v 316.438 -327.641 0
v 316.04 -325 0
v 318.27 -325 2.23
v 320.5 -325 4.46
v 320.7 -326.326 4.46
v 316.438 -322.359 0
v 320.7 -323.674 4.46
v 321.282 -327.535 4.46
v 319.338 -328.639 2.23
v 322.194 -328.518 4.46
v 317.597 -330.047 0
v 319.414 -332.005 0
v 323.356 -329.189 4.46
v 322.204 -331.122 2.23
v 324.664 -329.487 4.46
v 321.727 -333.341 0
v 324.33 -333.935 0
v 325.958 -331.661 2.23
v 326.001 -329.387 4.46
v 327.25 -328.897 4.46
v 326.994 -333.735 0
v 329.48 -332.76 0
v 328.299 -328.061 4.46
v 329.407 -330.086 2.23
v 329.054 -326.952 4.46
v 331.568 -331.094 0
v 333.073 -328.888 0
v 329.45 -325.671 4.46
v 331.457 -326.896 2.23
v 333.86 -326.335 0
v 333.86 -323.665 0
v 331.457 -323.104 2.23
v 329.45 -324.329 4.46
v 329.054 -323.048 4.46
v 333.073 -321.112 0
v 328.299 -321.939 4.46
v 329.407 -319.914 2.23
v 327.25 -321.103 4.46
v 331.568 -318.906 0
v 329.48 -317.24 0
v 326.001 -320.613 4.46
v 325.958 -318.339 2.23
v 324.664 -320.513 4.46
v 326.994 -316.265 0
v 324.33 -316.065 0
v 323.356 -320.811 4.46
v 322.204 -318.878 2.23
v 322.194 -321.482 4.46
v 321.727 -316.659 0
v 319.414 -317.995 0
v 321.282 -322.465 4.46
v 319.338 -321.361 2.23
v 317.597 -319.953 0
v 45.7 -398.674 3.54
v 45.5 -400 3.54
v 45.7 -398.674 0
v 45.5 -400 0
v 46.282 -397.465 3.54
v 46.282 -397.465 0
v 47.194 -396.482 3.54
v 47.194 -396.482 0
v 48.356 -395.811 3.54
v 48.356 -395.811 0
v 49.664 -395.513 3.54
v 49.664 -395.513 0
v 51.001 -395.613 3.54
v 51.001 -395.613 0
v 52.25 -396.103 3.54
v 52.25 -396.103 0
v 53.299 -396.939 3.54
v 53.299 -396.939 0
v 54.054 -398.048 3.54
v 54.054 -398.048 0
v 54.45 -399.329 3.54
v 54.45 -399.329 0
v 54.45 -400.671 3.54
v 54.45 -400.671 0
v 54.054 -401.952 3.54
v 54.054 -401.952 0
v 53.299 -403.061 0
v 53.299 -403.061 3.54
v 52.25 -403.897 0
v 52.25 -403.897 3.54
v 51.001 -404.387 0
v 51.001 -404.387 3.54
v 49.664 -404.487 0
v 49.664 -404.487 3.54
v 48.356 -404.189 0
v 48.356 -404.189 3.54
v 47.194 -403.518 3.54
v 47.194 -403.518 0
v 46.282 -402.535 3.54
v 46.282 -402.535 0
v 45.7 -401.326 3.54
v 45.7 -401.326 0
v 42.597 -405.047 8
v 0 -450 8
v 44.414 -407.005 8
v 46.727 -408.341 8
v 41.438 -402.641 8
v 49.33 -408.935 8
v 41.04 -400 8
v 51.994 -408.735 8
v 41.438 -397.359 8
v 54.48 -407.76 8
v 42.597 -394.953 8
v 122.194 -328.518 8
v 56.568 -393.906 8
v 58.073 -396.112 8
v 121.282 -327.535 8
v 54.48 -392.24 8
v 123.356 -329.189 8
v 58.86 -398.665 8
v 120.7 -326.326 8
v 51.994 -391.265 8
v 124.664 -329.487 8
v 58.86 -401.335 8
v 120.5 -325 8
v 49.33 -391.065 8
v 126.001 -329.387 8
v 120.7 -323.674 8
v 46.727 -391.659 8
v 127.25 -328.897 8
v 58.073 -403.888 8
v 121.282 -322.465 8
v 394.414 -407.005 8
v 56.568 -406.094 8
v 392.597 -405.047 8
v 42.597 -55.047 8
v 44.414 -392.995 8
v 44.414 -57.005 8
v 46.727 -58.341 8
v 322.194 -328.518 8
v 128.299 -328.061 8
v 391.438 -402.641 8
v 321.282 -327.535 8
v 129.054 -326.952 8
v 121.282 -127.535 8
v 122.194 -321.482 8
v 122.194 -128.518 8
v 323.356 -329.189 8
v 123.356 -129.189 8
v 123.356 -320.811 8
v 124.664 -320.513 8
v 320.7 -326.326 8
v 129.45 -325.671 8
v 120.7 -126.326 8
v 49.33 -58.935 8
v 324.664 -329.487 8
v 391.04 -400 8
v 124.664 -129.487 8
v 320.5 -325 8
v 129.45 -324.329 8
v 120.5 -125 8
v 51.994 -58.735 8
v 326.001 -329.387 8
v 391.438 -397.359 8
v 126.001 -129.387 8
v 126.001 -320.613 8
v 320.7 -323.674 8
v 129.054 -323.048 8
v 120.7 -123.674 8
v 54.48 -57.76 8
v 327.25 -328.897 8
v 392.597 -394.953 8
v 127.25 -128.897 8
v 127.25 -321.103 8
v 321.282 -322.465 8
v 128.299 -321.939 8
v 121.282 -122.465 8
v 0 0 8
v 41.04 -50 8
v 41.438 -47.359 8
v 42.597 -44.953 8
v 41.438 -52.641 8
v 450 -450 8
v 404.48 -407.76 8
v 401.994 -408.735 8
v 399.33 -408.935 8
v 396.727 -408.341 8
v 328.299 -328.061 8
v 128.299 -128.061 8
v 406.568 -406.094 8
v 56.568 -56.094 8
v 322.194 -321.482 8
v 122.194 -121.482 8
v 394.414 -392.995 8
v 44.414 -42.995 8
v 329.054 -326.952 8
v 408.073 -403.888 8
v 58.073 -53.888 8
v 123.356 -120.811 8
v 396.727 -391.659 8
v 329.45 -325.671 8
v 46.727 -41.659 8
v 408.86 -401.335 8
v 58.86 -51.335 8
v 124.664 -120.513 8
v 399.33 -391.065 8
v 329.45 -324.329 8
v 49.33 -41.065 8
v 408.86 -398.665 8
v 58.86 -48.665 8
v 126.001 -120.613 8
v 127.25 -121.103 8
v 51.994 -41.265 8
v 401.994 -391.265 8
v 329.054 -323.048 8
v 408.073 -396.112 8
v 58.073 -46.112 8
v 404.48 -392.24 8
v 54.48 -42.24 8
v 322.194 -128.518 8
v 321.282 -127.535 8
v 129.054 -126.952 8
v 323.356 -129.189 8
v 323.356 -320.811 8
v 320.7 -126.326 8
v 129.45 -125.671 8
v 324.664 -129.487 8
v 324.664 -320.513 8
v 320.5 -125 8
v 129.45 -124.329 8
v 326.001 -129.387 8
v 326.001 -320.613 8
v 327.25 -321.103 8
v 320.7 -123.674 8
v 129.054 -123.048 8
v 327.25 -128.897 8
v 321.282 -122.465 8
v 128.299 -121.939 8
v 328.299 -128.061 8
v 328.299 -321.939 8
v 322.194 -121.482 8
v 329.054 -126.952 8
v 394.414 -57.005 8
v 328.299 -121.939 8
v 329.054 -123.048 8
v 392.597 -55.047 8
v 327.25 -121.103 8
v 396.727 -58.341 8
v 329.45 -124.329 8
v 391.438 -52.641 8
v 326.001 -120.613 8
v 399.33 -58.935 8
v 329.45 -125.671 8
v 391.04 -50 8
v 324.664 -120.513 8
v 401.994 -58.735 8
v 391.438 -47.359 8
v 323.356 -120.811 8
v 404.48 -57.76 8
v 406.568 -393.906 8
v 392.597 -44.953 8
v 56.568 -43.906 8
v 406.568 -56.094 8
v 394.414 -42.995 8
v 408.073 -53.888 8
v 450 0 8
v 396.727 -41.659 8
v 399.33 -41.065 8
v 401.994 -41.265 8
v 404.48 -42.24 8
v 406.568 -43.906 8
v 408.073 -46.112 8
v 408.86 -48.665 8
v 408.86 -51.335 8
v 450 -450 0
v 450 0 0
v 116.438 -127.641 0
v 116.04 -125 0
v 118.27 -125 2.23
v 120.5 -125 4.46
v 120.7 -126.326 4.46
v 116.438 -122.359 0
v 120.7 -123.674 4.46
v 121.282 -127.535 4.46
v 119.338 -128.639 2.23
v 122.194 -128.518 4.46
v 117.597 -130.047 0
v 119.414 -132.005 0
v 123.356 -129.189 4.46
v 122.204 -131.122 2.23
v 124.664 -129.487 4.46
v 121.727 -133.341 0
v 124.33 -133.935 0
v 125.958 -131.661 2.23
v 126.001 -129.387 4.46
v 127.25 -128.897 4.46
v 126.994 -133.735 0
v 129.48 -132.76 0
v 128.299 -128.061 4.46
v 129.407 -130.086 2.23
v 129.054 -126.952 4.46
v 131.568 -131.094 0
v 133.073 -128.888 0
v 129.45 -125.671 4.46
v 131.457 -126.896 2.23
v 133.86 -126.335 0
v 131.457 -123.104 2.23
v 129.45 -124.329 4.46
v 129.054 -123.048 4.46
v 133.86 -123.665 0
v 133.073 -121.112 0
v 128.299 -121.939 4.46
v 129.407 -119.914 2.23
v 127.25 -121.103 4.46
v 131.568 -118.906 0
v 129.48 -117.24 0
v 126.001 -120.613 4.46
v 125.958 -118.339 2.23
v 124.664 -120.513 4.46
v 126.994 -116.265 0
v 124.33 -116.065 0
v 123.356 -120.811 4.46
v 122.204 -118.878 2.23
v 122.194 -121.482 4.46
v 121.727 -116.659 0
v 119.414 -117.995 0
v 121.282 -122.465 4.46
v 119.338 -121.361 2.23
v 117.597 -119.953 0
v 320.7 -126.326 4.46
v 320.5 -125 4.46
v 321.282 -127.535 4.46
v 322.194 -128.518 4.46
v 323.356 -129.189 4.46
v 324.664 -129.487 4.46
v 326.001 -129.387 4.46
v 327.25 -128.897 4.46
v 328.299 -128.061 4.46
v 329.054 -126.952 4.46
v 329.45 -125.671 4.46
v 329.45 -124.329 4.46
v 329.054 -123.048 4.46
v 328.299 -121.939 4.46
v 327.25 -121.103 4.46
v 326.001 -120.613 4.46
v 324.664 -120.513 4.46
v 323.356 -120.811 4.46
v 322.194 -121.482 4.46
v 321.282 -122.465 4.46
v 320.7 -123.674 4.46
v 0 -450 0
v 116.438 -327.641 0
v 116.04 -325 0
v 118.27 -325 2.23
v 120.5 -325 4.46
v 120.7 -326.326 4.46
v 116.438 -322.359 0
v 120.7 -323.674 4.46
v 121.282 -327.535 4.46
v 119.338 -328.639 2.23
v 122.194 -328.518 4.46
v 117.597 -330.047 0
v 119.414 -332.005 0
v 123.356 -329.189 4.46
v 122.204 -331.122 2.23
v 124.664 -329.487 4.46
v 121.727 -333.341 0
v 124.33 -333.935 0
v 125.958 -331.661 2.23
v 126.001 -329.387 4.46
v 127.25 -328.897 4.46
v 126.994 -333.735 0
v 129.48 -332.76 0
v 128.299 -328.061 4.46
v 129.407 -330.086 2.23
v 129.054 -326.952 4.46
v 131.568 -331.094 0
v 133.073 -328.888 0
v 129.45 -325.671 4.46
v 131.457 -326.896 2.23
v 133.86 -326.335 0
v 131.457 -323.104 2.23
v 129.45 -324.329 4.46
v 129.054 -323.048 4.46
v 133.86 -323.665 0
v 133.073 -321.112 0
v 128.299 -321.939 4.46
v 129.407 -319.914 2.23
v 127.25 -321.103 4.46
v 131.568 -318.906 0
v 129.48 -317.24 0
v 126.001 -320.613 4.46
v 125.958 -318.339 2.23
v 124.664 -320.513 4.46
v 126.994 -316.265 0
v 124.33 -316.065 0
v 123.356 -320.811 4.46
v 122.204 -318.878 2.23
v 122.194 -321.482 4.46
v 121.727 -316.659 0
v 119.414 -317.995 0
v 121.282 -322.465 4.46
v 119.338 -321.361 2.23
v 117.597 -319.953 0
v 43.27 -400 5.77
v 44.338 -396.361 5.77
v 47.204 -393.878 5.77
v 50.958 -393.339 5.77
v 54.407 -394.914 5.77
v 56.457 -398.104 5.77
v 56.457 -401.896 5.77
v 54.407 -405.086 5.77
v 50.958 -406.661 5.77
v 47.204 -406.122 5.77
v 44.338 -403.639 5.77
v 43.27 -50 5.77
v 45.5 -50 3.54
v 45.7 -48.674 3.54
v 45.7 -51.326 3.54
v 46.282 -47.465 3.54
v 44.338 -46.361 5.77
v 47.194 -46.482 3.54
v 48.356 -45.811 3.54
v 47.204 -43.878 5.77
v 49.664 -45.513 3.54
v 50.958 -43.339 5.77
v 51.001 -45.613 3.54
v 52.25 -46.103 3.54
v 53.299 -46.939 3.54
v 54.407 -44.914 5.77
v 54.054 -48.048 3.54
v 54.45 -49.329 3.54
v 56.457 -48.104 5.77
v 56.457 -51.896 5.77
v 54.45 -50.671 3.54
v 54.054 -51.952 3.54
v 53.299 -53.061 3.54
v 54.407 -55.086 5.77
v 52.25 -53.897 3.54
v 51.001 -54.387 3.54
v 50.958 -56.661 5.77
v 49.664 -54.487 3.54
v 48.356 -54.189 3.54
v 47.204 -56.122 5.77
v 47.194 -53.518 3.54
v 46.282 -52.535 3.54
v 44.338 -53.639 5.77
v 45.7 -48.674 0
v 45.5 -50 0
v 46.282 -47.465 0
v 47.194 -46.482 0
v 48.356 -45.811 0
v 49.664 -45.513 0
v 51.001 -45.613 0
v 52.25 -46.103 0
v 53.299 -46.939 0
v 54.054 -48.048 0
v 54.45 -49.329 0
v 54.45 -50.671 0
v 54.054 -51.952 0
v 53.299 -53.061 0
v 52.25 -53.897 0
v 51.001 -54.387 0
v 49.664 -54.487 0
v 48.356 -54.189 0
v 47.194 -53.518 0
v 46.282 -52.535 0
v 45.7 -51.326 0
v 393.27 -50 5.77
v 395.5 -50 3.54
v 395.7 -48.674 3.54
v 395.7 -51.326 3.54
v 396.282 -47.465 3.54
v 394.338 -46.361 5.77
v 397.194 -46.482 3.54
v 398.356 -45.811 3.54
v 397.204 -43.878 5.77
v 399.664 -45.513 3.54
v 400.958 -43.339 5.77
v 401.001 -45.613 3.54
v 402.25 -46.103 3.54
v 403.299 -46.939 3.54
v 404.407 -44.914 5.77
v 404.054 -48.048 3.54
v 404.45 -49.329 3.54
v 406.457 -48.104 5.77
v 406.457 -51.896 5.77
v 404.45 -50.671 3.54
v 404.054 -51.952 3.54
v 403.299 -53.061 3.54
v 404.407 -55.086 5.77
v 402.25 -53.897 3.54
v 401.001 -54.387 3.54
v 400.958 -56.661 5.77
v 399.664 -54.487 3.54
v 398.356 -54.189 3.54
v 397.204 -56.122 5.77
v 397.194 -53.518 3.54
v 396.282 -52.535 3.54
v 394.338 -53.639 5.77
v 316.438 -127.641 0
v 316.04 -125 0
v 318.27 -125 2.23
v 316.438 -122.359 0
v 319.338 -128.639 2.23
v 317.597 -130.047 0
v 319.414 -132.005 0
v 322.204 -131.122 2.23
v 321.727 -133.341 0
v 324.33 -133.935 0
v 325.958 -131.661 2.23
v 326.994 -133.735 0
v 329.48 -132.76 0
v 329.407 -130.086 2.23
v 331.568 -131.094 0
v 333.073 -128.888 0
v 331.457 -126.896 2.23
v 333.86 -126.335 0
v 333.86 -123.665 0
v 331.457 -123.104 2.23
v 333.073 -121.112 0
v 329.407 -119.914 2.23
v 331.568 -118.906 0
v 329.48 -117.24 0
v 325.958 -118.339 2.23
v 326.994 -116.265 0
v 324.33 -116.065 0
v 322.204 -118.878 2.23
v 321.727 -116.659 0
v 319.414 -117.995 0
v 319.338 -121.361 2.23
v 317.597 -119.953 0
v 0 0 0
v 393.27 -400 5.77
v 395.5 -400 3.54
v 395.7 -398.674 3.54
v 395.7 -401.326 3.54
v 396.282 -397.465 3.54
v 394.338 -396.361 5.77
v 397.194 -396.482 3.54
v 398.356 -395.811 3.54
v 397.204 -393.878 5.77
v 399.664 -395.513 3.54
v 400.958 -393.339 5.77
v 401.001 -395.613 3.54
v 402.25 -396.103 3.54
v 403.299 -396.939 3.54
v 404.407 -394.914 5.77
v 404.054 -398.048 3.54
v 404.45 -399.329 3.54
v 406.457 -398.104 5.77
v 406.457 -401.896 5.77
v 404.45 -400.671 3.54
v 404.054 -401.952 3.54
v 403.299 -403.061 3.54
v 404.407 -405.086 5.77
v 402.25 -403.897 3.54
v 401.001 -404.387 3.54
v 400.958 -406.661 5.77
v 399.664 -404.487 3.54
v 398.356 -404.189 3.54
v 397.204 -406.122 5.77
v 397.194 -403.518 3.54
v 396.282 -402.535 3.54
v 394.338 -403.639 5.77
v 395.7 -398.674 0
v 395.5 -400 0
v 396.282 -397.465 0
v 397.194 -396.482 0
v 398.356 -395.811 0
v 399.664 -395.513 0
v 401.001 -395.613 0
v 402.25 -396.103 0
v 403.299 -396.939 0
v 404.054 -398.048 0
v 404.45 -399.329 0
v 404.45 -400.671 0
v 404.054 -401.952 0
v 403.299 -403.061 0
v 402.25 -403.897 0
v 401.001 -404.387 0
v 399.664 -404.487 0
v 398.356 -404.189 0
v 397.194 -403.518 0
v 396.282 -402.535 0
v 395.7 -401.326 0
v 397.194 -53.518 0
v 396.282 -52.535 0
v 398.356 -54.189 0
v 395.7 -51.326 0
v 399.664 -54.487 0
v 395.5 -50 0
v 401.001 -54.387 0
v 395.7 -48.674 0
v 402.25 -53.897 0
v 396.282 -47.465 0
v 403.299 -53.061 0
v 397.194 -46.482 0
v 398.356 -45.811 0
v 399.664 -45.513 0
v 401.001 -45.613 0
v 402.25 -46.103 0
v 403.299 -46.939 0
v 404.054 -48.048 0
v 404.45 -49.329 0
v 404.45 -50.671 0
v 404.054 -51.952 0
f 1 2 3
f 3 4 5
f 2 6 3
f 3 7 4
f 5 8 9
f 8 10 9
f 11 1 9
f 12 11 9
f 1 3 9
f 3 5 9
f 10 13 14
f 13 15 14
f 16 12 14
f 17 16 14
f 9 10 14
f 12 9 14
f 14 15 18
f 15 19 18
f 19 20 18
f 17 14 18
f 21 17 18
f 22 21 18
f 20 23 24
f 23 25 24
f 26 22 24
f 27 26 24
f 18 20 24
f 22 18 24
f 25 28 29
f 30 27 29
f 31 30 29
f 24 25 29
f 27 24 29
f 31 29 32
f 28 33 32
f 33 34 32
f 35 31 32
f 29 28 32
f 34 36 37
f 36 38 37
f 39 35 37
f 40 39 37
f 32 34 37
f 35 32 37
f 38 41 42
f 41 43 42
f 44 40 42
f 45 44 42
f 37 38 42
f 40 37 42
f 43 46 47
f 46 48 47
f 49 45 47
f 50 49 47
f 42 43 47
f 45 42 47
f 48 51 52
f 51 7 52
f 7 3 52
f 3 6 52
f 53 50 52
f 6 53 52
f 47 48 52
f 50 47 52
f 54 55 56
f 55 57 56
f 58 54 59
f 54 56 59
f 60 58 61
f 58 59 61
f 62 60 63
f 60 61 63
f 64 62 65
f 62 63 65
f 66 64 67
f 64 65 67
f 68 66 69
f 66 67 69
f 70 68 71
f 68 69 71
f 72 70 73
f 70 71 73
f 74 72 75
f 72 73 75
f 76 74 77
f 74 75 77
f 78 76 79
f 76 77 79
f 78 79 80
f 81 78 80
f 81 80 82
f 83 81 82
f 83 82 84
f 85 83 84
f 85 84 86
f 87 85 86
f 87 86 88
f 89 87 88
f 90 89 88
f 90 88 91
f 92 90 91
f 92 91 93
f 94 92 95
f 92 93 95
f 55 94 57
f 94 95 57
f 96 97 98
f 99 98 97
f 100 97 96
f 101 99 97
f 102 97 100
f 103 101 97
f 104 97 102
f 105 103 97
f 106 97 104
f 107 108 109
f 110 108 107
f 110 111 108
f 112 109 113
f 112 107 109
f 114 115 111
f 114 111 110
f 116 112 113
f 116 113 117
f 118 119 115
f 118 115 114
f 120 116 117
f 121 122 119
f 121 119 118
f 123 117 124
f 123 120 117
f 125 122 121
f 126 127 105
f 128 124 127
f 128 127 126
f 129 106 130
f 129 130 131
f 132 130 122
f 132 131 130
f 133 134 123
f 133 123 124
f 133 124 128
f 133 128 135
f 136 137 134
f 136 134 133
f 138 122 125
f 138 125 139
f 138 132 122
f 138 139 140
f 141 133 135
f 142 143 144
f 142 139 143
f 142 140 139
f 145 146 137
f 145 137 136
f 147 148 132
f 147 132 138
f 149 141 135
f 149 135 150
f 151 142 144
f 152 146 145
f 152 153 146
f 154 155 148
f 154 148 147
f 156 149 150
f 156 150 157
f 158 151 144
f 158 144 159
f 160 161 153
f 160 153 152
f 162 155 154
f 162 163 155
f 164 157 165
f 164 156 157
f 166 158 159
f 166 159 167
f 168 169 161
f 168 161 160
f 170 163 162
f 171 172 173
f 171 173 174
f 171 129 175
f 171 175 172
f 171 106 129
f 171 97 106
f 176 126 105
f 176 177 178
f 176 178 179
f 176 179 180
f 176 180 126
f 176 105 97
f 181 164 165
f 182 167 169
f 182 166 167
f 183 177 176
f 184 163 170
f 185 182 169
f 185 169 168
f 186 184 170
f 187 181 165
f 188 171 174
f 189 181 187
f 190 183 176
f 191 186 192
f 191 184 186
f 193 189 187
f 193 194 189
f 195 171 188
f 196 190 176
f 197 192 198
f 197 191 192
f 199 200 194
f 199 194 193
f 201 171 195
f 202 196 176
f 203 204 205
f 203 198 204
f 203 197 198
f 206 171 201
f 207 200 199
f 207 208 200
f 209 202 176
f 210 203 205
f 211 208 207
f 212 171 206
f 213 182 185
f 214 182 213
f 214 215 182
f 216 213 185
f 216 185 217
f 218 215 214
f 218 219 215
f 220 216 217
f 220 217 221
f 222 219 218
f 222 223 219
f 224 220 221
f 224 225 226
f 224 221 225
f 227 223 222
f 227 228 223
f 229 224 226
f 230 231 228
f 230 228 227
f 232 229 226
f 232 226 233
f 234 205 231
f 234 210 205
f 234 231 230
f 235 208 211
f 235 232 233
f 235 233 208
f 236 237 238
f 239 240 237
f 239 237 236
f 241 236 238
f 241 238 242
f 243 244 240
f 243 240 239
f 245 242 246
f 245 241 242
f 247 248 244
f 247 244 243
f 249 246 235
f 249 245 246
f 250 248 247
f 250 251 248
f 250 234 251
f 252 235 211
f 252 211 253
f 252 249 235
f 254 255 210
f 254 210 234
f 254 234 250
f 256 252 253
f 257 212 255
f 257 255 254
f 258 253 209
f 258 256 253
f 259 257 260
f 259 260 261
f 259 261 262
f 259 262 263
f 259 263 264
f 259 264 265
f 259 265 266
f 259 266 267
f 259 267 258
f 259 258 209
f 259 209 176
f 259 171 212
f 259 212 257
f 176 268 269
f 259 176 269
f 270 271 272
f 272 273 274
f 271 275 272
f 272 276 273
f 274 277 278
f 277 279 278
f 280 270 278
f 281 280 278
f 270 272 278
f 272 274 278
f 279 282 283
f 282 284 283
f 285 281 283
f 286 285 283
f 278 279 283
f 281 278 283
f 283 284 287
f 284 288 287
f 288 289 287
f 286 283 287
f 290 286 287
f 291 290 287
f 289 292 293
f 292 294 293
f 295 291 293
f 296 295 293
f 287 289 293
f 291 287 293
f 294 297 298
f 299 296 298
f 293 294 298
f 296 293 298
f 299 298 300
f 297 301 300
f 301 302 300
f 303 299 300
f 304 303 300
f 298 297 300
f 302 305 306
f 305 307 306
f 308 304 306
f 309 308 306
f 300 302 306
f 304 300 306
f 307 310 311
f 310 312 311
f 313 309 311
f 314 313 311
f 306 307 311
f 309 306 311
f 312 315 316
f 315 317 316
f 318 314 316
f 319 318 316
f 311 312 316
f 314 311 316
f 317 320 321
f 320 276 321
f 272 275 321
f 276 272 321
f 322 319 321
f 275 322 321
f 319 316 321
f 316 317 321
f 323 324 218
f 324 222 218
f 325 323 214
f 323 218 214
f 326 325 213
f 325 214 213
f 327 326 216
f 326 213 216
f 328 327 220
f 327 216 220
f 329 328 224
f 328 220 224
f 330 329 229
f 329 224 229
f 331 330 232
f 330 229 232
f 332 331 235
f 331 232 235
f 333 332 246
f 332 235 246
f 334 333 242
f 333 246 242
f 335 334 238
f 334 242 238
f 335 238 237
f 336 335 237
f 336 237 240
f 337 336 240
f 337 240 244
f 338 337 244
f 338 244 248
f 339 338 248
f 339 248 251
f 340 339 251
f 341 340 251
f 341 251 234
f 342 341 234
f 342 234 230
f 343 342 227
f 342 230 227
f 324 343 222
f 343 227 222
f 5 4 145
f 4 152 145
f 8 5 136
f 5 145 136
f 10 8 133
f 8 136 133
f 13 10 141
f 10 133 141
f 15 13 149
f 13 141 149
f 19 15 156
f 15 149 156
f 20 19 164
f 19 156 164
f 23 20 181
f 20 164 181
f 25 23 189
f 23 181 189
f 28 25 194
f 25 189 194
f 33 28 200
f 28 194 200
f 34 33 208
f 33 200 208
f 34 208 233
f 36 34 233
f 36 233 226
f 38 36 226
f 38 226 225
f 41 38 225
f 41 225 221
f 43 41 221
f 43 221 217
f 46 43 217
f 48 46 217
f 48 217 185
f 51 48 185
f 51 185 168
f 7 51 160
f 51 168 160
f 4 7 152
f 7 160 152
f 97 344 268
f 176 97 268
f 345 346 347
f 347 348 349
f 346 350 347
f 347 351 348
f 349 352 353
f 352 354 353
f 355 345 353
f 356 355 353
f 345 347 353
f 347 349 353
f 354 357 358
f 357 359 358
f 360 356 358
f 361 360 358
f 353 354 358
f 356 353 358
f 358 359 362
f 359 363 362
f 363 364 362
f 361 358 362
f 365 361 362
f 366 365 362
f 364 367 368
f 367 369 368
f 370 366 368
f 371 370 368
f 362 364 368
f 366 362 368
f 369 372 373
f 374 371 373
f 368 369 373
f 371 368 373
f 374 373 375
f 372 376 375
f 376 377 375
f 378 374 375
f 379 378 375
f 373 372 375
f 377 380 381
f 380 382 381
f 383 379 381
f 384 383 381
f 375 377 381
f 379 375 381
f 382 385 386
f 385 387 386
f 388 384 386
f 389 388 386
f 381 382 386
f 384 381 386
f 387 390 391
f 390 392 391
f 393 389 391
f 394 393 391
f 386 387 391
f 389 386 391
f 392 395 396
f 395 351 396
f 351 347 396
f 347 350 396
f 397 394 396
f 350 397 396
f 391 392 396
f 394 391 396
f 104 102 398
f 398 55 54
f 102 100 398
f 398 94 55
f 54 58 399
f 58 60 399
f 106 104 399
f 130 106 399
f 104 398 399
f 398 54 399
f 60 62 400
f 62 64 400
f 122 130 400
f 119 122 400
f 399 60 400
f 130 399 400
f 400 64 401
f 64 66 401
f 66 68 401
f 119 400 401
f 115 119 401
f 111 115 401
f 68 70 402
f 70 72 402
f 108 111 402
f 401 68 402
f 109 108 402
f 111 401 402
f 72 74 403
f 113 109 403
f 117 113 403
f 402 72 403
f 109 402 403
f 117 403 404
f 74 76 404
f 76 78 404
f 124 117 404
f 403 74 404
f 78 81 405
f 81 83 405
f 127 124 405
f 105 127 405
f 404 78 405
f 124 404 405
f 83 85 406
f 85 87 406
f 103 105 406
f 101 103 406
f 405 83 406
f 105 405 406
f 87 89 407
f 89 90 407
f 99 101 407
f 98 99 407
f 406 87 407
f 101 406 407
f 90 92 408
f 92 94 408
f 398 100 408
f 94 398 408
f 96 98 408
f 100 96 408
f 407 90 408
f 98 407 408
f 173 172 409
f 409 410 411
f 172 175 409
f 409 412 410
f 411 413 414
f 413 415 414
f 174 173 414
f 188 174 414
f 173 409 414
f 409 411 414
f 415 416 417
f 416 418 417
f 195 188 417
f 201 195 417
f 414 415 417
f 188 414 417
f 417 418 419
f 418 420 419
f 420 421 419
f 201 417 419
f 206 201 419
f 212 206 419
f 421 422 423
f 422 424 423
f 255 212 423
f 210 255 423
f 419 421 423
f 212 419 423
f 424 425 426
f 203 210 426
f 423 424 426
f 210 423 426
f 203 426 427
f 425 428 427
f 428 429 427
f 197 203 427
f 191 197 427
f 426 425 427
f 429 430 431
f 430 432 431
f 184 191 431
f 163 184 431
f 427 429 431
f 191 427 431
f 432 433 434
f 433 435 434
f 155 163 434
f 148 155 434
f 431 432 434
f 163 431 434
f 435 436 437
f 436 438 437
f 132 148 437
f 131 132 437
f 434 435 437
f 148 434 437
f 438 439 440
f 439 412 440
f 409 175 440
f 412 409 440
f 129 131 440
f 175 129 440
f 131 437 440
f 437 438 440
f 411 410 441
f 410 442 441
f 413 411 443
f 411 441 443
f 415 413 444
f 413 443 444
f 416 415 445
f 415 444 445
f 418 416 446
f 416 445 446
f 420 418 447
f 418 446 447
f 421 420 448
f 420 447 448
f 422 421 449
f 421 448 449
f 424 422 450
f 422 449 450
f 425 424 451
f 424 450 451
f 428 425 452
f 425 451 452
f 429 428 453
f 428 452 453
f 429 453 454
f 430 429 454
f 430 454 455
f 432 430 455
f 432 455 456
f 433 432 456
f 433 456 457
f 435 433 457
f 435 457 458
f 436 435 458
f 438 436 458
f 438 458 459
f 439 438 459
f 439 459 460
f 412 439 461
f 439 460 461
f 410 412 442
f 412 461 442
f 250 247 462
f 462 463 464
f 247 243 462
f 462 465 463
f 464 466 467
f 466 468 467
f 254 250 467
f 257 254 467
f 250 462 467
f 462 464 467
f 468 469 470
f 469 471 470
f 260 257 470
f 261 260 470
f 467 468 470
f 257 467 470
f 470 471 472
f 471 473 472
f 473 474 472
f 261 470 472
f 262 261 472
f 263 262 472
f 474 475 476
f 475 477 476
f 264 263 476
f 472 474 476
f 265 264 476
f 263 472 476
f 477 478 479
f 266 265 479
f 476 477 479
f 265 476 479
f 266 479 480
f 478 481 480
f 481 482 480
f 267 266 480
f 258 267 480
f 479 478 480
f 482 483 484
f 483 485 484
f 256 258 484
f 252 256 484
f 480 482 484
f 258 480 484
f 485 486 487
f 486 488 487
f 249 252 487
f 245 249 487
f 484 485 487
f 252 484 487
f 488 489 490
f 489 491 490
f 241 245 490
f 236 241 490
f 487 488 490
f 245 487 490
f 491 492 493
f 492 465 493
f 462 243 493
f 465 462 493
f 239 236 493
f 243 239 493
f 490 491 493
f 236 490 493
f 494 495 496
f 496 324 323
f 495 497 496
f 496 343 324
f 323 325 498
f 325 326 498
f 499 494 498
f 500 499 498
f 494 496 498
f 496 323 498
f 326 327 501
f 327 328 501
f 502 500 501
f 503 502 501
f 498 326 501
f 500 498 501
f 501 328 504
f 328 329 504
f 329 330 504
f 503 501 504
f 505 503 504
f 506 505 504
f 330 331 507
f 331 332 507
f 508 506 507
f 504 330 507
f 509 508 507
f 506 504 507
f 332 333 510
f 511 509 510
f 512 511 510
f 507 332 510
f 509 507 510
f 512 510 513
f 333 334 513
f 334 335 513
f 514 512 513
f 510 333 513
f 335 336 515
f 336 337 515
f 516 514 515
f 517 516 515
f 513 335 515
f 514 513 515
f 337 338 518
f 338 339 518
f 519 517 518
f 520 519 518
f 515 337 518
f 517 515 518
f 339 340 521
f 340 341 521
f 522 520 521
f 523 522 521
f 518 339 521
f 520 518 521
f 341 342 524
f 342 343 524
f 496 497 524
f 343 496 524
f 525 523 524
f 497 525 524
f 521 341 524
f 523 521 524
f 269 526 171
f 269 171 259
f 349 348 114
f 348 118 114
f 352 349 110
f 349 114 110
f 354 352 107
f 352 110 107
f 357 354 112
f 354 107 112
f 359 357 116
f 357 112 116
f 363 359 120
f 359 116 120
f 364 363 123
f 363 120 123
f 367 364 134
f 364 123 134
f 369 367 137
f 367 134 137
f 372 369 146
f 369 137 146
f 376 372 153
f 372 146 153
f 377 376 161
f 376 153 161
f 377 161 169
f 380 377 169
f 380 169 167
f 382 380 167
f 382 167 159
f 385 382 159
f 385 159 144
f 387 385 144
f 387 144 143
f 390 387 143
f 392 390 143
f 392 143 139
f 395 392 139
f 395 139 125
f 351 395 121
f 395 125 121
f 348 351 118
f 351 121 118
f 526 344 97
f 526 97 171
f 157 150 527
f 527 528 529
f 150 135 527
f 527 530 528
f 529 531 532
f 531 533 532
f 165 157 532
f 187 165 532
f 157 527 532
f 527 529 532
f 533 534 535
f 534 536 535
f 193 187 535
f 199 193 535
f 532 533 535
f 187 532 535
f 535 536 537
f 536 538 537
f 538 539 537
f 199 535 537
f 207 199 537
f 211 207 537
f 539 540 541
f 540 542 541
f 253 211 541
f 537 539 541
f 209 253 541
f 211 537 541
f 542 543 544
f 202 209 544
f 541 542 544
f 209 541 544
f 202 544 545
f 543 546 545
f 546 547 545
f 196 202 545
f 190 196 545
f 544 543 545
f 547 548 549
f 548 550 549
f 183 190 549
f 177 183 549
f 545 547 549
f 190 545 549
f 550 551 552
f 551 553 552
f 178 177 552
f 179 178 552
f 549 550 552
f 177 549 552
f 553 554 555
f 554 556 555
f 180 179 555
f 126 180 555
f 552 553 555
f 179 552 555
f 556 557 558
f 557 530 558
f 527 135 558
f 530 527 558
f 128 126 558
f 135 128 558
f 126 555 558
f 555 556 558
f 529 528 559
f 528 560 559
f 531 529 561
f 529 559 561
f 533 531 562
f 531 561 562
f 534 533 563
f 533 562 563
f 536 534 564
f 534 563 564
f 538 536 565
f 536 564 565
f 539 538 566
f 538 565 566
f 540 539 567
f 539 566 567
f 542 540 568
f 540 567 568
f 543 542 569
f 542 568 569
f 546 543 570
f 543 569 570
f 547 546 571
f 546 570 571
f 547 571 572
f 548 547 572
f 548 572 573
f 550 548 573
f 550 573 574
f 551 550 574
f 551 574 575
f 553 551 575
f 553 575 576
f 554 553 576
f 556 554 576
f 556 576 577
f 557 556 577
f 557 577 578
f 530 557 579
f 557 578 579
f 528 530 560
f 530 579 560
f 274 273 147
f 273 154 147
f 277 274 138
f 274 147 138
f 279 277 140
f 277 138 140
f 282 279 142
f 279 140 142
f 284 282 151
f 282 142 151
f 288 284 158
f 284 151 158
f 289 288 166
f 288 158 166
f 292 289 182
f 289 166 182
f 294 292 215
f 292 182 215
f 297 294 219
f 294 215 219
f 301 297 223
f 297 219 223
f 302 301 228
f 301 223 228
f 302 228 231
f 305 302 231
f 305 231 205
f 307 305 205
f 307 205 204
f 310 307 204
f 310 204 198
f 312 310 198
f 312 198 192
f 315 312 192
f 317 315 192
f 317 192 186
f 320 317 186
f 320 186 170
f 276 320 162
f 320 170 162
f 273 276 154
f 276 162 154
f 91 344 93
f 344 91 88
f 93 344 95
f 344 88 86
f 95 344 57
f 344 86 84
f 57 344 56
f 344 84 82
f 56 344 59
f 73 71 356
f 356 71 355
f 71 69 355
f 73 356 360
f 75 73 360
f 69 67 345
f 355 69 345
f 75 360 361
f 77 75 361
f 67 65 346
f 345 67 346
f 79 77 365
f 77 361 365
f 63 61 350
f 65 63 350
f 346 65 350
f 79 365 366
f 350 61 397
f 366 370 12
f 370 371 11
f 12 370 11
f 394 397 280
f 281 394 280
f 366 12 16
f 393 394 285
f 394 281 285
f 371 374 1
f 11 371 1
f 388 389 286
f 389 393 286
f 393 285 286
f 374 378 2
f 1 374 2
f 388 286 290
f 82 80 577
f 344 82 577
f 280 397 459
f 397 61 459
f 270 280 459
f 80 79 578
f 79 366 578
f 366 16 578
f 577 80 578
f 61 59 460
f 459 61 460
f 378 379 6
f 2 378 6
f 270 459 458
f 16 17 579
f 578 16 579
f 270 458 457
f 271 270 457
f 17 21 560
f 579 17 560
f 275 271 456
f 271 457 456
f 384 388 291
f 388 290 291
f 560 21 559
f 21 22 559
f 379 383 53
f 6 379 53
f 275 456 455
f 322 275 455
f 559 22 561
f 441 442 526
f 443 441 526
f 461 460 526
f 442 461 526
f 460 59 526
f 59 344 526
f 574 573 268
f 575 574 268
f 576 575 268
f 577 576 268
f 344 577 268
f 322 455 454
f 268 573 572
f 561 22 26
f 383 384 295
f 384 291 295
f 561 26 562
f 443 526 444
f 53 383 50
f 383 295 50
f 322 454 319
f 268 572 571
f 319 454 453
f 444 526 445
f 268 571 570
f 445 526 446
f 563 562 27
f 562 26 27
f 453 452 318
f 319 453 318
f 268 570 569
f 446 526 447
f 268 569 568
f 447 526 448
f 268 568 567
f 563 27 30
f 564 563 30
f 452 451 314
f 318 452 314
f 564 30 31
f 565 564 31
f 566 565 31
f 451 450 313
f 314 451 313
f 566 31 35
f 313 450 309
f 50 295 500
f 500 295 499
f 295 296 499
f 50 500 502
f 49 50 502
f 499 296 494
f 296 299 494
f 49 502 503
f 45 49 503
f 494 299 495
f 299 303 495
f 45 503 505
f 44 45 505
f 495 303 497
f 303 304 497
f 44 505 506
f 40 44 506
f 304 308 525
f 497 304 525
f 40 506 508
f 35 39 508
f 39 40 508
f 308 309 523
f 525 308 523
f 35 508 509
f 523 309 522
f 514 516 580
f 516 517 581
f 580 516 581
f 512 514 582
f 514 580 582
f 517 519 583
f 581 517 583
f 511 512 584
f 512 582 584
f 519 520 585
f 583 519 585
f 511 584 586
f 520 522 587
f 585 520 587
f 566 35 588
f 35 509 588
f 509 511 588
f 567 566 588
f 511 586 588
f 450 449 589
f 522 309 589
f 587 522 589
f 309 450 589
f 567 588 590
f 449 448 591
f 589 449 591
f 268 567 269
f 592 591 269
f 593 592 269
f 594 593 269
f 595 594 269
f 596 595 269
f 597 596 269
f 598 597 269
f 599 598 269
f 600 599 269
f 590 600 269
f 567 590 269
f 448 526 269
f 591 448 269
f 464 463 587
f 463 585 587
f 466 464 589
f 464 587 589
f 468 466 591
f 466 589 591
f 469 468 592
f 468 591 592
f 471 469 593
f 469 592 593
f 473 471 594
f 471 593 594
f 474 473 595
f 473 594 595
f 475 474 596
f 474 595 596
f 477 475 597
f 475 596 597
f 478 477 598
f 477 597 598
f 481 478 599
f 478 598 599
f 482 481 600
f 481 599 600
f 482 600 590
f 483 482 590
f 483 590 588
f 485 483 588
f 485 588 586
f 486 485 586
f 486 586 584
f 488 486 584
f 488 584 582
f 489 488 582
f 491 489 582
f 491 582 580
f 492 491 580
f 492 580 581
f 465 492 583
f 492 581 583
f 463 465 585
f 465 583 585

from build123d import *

# Parameters (mm, degrees)
F0_W           = 450
F0_H           = 450
F1_DEPTH       = 8
F3_D           = 9
F3_CSINK_D     = 17.92
F3_CSINK_ANGLE = 90
F5_D           = 9
F5_CSINK_D     = 17.92
F5_CSINK_ANGLE = 90


with BuildPart() as f1:
    # F0 (on Top) → F1 (new body)
    with BuildSketch(Plane.XY):
        with Locations((225, -225)):
            Rectangle(F0_W, F0_H)
    extrude(amount=F1_DEPTH)

    # F3 (through all)
    with Locations(Plane.XY.offset(8)):
        with Locations((50, -400), (400, -400), (400, -50), (50, -50)):
            CounterSinkHole(F3_D / 2, F3_CSINK_D / 2, counter_sink_angle=F3_CSINK_ANGLE)

    # F5 (through all)
    with Locations(Plane(origin=(0, 0, 0), x_dir=(1, 0, 0), z_dir=(0, 0, -1))):
        with Locations((125, 325), (325, 125), (325, 325), (125, 125)):
            CounterSinkHole(F5_D / 2, F5_CSINK_D / 2, counter_sink_angle=F5_CSINK_ANGLE)


solid = f1.part
